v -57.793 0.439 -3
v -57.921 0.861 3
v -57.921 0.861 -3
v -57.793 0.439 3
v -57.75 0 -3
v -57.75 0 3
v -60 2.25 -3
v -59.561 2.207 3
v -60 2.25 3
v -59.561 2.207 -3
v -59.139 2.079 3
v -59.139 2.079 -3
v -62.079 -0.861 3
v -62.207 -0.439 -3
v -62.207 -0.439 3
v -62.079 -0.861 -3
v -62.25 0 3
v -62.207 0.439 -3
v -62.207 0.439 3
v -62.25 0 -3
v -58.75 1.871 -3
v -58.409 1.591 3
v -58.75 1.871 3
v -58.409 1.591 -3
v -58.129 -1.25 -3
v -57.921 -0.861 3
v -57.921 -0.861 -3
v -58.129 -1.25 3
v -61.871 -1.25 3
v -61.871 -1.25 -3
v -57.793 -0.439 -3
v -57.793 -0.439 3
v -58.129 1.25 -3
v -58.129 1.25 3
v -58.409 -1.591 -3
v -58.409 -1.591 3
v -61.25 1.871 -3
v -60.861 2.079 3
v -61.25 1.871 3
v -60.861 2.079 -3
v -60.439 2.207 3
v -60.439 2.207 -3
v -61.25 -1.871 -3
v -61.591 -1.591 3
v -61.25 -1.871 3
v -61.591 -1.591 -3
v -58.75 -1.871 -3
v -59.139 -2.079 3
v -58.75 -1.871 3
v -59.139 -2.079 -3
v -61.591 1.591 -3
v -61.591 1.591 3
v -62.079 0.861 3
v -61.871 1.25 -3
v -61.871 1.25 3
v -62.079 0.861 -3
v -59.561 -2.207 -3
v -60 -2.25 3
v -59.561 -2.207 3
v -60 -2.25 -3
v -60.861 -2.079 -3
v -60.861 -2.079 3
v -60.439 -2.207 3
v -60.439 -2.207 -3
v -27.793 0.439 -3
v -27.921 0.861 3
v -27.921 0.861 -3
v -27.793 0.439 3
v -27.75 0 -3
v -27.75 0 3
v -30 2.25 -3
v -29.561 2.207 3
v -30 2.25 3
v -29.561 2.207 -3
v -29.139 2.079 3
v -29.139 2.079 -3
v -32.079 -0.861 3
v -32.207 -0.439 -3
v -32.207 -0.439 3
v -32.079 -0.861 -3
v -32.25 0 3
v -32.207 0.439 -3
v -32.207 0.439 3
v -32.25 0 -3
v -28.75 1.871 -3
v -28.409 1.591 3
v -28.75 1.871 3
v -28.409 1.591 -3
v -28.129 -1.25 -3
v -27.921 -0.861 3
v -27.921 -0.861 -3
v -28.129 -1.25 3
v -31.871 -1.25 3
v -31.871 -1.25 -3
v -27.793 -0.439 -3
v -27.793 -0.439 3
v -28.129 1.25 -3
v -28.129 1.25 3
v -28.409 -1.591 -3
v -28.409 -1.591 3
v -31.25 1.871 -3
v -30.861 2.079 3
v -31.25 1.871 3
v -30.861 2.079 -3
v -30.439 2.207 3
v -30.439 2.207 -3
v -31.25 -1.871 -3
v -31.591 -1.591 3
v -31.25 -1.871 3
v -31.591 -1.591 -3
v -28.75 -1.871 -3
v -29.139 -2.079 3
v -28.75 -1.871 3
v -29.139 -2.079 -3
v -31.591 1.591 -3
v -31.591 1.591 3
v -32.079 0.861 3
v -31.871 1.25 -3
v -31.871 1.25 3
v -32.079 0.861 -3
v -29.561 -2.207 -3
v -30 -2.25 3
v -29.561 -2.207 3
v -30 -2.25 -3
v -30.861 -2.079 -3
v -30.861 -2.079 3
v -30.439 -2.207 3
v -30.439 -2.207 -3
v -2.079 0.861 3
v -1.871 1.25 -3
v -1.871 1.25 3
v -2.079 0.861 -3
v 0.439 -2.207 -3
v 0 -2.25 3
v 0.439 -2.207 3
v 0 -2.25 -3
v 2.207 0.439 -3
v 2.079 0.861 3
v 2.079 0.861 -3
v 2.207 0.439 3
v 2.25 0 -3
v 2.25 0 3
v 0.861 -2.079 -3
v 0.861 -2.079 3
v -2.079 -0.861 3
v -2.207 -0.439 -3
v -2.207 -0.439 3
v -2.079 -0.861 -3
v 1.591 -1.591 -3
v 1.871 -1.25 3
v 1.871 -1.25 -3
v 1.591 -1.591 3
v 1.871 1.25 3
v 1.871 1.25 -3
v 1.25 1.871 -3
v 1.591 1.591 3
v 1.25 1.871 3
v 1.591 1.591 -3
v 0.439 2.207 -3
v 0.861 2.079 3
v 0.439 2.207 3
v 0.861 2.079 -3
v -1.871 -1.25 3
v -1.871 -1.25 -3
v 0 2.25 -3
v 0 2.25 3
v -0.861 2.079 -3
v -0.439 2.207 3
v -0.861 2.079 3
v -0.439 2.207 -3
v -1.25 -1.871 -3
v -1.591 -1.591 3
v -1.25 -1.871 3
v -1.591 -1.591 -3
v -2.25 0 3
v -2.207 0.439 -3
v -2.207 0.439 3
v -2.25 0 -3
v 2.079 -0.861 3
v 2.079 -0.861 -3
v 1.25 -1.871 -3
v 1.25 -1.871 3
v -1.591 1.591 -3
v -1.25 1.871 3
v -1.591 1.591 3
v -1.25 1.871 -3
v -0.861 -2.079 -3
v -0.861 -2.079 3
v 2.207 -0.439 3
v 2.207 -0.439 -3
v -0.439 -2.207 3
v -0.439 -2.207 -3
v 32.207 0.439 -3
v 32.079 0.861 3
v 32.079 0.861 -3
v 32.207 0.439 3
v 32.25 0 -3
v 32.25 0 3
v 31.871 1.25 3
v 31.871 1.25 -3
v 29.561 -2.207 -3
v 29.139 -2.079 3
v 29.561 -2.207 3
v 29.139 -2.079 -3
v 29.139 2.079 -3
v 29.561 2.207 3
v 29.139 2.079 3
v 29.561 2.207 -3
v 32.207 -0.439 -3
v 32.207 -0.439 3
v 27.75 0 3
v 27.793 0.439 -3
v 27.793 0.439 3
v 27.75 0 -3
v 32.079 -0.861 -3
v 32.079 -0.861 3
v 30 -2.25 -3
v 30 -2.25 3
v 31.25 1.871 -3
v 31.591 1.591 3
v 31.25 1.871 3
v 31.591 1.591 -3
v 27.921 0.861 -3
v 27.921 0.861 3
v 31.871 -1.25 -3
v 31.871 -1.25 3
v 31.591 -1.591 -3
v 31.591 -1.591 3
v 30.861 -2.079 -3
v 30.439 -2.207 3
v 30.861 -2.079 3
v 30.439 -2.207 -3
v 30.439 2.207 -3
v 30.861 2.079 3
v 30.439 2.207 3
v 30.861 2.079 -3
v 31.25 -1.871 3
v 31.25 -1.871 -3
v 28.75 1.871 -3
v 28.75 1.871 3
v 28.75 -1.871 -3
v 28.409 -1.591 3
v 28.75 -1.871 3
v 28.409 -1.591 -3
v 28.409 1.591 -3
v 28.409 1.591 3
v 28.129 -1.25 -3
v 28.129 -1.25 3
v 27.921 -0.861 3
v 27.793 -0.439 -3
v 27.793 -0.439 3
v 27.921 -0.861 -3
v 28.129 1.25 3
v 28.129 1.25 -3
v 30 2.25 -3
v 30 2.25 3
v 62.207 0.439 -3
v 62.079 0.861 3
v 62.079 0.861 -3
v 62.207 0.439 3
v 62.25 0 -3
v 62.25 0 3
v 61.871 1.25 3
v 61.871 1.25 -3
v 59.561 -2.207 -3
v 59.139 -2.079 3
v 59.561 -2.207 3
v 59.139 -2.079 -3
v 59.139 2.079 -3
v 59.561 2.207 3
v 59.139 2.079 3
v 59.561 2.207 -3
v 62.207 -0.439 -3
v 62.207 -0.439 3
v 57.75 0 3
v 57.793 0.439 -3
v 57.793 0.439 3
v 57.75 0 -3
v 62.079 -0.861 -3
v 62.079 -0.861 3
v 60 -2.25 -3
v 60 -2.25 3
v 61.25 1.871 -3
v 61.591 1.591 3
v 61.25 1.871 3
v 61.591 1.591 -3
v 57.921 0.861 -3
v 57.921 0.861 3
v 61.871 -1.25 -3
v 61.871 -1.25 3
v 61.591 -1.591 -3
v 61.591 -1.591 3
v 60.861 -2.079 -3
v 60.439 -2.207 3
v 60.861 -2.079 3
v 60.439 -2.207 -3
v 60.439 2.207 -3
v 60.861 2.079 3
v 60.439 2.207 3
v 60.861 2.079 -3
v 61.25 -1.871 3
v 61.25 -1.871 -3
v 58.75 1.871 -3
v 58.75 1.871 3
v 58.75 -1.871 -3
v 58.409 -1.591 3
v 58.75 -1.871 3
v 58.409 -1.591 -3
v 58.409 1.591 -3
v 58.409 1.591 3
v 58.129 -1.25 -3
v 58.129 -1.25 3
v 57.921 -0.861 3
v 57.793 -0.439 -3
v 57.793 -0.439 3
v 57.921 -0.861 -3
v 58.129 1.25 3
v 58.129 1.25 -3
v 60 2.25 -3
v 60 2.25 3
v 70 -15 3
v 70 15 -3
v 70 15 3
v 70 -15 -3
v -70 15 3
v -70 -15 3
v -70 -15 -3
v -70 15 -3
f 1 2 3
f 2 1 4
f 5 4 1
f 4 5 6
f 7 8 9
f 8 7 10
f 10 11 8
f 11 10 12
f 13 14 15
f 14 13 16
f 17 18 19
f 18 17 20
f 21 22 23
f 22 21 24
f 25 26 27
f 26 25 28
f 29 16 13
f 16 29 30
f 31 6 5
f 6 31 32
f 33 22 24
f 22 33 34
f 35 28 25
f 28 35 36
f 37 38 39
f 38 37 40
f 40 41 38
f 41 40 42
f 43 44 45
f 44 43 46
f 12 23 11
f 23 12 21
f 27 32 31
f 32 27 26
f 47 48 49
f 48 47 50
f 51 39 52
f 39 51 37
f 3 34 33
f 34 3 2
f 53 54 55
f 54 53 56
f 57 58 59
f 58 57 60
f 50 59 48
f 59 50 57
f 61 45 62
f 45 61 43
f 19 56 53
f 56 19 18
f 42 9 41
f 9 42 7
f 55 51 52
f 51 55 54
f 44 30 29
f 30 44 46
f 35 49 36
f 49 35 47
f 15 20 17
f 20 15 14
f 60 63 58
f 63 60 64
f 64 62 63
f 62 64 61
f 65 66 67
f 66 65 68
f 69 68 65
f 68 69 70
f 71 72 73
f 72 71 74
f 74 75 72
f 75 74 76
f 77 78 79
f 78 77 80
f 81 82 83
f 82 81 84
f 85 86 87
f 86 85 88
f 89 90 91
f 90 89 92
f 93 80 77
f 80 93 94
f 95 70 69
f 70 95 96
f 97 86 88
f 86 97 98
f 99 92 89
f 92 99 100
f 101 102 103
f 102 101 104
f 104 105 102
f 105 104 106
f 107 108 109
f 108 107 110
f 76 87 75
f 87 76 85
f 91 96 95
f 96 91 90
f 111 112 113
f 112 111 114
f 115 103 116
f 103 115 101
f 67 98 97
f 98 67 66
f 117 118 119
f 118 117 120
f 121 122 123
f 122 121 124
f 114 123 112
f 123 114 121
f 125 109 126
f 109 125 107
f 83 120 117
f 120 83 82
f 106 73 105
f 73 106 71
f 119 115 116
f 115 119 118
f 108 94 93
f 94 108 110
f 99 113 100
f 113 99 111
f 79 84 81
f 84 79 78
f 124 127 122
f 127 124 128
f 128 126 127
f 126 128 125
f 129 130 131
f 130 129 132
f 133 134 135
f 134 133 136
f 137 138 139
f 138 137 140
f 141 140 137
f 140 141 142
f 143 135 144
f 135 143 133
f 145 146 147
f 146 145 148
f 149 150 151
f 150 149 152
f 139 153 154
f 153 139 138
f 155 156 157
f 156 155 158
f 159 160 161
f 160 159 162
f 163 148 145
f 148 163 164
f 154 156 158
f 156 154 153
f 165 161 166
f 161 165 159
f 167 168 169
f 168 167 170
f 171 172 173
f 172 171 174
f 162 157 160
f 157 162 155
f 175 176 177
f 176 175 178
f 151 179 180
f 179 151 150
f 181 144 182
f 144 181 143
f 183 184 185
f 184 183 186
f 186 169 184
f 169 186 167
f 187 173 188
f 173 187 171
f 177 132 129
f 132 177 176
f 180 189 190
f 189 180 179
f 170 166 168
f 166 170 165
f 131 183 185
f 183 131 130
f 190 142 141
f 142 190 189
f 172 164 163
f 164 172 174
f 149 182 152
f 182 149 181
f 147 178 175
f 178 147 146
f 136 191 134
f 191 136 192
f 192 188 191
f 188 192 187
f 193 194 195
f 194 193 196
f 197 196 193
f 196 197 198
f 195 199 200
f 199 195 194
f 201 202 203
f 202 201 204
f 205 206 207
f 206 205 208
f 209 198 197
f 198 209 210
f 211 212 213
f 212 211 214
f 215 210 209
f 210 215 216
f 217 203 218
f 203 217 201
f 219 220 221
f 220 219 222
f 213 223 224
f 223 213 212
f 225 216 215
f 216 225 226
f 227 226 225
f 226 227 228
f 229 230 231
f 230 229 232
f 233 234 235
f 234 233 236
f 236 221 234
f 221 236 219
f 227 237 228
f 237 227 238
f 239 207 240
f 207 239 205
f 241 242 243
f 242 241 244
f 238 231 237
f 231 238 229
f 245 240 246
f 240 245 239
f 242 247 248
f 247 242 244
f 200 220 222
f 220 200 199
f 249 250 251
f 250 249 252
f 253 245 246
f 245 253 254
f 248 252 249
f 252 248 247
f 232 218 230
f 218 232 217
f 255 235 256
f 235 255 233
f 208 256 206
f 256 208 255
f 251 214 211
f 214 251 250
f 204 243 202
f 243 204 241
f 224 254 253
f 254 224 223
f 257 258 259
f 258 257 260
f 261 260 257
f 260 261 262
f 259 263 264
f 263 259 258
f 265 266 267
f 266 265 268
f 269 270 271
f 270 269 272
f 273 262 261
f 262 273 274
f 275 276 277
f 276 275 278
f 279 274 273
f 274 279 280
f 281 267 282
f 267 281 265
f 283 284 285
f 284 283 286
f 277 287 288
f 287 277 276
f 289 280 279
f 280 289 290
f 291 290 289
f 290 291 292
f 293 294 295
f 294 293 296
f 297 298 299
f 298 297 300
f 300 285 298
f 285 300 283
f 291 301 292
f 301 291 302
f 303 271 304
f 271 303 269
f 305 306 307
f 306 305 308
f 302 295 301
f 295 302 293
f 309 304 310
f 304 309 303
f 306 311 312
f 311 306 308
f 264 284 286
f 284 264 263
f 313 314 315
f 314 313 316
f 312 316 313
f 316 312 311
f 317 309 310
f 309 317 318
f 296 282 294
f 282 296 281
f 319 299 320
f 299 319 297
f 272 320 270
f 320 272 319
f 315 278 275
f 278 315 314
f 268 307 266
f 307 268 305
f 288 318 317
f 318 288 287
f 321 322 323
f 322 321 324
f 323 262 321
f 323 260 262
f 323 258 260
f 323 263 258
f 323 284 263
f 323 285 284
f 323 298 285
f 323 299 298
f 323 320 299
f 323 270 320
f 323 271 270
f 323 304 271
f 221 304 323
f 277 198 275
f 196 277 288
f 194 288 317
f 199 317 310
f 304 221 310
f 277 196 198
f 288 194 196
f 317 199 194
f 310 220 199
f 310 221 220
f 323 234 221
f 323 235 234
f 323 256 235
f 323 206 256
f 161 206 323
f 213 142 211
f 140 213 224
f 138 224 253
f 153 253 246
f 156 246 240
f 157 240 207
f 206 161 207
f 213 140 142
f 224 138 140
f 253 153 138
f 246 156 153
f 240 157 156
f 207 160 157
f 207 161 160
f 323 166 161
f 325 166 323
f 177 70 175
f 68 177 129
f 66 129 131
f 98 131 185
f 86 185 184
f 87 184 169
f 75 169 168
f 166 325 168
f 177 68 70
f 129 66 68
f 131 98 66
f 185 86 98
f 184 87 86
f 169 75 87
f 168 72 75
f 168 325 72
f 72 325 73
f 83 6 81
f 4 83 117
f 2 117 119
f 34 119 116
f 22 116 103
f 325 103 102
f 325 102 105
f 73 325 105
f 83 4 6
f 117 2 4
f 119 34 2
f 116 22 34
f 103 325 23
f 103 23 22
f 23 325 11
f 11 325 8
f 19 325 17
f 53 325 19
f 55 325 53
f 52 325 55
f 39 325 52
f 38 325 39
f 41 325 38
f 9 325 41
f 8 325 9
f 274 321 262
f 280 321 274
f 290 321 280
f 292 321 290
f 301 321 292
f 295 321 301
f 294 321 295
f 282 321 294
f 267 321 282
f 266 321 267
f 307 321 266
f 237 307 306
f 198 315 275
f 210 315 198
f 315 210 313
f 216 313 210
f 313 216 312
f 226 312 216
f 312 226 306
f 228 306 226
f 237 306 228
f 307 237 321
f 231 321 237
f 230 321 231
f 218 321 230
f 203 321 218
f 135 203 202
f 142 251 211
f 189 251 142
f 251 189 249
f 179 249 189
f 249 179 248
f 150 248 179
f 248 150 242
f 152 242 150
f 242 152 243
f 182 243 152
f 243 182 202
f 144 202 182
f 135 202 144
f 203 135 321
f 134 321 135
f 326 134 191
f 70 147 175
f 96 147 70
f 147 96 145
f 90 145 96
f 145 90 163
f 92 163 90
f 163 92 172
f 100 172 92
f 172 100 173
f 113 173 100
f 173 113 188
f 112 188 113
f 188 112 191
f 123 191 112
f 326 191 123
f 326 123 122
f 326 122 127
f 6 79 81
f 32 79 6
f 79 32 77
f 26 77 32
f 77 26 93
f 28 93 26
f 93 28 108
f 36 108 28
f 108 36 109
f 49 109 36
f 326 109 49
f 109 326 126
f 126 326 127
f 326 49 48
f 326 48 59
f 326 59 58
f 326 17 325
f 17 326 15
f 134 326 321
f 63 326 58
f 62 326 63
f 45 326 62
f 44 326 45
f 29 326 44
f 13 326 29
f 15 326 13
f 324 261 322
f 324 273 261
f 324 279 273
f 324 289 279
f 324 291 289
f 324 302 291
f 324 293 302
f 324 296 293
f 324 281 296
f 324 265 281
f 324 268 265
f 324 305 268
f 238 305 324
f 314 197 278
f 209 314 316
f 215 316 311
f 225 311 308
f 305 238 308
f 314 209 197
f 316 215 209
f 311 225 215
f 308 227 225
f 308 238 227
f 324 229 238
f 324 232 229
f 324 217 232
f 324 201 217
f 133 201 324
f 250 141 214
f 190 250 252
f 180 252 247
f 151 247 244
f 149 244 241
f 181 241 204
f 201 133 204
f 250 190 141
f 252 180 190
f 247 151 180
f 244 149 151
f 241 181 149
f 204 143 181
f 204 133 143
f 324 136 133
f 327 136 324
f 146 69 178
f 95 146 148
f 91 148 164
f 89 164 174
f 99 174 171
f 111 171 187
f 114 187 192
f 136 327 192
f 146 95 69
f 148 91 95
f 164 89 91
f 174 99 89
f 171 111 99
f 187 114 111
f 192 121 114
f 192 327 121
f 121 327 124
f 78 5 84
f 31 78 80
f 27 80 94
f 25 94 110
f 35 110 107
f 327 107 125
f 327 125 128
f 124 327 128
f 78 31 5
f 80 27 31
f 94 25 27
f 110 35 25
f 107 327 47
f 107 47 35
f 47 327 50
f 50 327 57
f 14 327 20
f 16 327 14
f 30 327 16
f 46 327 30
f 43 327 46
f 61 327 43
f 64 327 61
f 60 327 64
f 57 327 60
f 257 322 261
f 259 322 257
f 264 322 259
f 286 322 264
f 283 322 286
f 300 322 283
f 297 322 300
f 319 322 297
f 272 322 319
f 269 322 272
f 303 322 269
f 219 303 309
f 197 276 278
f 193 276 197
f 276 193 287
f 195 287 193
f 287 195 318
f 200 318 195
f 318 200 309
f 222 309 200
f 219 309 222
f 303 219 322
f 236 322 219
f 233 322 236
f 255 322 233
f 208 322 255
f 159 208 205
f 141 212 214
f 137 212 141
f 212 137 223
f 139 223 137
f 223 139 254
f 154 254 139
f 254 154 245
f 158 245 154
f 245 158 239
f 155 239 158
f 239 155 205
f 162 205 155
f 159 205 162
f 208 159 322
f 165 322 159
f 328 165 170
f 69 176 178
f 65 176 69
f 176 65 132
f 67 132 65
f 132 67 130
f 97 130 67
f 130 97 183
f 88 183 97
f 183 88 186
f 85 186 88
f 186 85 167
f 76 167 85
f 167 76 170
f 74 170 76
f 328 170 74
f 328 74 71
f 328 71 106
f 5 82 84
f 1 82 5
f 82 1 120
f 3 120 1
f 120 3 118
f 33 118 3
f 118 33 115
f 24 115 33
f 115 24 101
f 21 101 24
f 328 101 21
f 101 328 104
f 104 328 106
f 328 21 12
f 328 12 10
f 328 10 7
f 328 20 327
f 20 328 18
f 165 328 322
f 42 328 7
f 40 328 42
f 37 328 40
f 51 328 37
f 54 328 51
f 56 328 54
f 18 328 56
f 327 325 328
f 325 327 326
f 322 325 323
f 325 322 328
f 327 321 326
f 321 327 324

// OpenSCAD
$fn = 32;

// ----------------------------------------------------------------------
// Hole bar, 5 x Ø4.5
// skip layout, 10 mm edge offset
// ----------------------------------------------------------------------

// --- parameters (mm) ---
bar_w = 30;       // bar width (Y)
bar_t = 6;        // bar thickness (Z)
holes = 5;        // holes per row
hole_d = 4.5;     // hole diameter
edge = 10;        // offset from the bar end to the first hole
grid_pitch = 15;  // grid the bar was laid out on

// --- derived feature positions (mm) ---
pitch = grid_pitch * 2;       // = 30   holes sit every other grid slot
span = (holes - 1) * pitch;   // = 120   distance between the end holes
bar_l = span + 2 * edge;      // = 140   overall bar length
start_x = -bar_l / 2 + edge;  // = -60   X of the first hole
feature_centers = [
  [start_x + 0 * pitch, 0],
  [start_x + 1 * pitch, 0],
  [start_x + 2 * pitch, 0],
  [start_x + 3 * pitch, 0],
  [start_x + 4 * pitch, 0]
];   // hole centres of the first row

// bar with one row of holes, drilled from feature_centers
difference() {
  translate([-bar_l / 2, -bar_w / 2, -bar_t / 2]) cube([bar_l, bar_w, bar_t]);
  for (centre = feature_centers)
    translate([centre[0], centre[1], 0])
      cylinder(d = hole_d, h = bar_t + 2, center = true);
}
